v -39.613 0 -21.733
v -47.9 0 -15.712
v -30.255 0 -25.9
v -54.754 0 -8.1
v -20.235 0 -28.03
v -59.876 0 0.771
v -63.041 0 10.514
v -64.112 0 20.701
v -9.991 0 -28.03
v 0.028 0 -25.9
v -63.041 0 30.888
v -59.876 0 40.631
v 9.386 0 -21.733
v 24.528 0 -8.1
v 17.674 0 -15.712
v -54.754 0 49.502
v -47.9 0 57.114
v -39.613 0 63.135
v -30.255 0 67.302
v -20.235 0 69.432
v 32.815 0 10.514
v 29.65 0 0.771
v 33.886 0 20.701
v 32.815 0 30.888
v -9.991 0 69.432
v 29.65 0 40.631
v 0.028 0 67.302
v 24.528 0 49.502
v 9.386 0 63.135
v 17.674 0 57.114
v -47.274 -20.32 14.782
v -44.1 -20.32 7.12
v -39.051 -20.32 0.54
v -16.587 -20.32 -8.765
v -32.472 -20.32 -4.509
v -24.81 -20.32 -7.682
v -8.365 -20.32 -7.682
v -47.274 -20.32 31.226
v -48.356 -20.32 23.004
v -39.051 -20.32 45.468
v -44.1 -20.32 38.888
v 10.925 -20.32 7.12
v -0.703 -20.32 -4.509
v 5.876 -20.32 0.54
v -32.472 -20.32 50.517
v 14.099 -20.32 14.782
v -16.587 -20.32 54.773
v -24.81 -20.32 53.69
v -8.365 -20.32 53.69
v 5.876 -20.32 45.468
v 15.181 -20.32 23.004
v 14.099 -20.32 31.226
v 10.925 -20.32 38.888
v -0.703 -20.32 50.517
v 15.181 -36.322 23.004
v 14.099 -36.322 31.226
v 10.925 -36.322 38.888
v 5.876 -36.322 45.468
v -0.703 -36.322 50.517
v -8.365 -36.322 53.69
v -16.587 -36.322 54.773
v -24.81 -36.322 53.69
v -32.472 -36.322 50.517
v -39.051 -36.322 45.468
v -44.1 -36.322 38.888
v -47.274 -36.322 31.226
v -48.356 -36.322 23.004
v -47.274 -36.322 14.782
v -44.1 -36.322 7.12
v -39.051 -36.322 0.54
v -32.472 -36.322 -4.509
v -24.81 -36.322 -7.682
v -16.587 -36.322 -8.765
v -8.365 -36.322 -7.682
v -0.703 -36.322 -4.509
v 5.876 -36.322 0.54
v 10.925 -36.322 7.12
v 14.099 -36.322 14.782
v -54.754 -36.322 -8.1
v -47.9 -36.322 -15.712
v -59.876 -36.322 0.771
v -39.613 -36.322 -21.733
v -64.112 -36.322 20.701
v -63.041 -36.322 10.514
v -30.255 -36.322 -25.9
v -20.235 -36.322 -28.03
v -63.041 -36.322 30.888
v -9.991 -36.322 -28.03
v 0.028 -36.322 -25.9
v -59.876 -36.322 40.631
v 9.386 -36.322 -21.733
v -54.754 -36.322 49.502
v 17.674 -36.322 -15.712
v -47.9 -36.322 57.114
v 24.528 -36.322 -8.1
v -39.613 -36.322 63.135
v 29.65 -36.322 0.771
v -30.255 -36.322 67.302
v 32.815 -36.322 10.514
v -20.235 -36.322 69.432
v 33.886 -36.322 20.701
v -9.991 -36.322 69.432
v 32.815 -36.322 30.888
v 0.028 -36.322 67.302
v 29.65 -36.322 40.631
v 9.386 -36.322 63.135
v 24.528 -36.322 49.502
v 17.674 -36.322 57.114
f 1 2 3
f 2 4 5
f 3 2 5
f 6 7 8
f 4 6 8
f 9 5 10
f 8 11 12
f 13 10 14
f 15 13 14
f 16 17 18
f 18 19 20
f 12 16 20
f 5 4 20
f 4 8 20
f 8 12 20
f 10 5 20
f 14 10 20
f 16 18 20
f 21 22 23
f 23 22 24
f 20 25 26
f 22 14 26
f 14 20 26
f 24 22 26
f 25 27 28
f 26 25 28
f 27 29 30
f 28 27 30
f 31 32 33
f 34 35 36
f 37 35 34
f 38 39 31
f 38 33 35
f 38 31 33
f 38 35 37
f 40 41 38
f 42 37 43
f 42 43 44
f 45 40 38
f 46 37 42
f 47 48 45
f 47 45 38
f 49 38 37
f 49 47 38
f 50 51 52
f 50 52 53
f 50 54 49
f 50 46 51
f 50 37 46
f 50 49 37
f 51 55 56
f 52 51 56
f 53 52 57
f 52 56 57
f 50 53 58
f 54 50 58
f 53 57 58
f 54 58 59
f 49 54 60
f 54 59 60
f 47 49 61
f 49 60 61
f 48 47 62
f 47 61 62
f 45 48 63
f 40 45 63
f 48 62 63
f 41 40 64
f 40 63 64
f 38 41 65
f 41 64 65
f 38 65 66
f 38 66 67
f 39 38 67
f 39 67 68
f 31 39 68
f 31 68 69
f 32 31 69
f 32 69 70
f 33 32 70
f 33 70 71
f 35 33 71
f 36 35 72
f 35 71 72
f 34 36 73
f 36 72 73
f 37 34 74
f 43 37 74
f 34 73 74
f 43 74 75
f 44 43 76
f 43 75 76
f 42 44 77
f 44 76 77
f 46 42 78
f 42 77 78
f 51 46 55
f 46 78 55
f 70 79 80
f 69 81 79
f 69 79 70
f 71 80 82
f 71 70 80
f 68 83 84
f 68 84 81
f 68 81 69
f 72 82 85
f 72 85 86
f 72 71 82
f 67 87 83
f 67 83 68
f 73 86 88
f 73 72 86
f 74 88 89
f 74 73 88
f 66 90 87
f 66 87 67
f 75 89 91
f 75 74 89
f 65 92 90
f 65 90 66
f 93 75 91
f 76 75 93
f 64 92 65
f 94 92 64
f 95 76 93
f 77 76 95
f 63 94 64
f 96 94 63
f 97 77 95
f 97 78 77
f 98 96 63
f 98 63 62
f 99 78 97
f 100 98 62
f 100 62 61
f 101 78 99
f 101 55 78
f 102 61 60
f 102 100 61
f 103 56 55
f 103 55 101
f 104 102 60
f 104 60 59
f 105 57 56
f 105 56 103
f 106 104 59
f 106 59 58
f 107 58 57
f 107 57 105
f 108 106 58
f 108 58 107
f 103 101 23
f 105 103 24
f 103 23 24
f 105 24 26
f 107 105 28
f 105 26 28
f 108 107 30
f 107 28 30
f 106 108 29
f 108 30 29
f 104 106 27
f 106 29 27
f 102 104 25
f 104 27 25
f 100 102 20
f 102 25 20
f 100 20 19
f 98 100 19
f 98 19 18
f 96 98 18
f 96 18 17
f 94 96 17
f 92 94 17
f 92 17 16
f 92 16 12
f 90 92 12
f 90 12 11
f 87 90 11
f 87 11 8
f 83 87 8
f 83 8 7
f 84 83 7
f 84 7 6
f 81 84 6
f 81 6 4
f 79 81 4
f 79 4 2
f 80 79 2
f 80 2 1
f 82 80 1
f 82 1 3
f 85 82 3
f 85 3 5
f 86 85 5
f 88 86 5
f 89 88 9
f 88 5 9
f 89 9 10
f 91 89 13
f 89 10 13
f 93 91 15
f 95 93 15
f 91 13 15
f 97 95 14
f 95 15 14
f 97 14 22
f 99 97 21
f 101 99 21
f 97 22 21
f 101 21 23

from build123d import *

# Parameters (mm, degrees)
F0_R      = 48.999034
F1_DEPTH  = 50.8
F1_FACE_R = 48.999034
F2_DEPTH  = 14.478
F3_R      = 31.768864
F4_DEPTH  = 16.002


with BuildPart() as f1:
    # F0 (on Front) → F1 (new body)
    with BuildSketch(Plane.XZ):
        with Locations((-15.113131, 20.701002)):
            Circle(F0_R)
    extrude(amount=F1_DEPTH)

    # F1_face (on face) → F2 (cut)
    with BuildSketch(Plane(origin=(-15.113131, -50.8, 20.701002), x_dir=(1, 0, 0), z_dir=(0, -1, 0))):
        Circle(F1_FACE_R)
    extrude(amount=-F2_DEPTH, mode=Mode.SUBTRACT)

    # F3 (on face) → F4 (cut)
    with BuildSketch(Plane.XZ.offset(36.322)):
        with Locations((-16.587488, 23.004033)):
            Circle(F3_R)
    extrude(amount=-F4_DEPTH, mode=Mode.SUBTRACT)


solid = f1.part
